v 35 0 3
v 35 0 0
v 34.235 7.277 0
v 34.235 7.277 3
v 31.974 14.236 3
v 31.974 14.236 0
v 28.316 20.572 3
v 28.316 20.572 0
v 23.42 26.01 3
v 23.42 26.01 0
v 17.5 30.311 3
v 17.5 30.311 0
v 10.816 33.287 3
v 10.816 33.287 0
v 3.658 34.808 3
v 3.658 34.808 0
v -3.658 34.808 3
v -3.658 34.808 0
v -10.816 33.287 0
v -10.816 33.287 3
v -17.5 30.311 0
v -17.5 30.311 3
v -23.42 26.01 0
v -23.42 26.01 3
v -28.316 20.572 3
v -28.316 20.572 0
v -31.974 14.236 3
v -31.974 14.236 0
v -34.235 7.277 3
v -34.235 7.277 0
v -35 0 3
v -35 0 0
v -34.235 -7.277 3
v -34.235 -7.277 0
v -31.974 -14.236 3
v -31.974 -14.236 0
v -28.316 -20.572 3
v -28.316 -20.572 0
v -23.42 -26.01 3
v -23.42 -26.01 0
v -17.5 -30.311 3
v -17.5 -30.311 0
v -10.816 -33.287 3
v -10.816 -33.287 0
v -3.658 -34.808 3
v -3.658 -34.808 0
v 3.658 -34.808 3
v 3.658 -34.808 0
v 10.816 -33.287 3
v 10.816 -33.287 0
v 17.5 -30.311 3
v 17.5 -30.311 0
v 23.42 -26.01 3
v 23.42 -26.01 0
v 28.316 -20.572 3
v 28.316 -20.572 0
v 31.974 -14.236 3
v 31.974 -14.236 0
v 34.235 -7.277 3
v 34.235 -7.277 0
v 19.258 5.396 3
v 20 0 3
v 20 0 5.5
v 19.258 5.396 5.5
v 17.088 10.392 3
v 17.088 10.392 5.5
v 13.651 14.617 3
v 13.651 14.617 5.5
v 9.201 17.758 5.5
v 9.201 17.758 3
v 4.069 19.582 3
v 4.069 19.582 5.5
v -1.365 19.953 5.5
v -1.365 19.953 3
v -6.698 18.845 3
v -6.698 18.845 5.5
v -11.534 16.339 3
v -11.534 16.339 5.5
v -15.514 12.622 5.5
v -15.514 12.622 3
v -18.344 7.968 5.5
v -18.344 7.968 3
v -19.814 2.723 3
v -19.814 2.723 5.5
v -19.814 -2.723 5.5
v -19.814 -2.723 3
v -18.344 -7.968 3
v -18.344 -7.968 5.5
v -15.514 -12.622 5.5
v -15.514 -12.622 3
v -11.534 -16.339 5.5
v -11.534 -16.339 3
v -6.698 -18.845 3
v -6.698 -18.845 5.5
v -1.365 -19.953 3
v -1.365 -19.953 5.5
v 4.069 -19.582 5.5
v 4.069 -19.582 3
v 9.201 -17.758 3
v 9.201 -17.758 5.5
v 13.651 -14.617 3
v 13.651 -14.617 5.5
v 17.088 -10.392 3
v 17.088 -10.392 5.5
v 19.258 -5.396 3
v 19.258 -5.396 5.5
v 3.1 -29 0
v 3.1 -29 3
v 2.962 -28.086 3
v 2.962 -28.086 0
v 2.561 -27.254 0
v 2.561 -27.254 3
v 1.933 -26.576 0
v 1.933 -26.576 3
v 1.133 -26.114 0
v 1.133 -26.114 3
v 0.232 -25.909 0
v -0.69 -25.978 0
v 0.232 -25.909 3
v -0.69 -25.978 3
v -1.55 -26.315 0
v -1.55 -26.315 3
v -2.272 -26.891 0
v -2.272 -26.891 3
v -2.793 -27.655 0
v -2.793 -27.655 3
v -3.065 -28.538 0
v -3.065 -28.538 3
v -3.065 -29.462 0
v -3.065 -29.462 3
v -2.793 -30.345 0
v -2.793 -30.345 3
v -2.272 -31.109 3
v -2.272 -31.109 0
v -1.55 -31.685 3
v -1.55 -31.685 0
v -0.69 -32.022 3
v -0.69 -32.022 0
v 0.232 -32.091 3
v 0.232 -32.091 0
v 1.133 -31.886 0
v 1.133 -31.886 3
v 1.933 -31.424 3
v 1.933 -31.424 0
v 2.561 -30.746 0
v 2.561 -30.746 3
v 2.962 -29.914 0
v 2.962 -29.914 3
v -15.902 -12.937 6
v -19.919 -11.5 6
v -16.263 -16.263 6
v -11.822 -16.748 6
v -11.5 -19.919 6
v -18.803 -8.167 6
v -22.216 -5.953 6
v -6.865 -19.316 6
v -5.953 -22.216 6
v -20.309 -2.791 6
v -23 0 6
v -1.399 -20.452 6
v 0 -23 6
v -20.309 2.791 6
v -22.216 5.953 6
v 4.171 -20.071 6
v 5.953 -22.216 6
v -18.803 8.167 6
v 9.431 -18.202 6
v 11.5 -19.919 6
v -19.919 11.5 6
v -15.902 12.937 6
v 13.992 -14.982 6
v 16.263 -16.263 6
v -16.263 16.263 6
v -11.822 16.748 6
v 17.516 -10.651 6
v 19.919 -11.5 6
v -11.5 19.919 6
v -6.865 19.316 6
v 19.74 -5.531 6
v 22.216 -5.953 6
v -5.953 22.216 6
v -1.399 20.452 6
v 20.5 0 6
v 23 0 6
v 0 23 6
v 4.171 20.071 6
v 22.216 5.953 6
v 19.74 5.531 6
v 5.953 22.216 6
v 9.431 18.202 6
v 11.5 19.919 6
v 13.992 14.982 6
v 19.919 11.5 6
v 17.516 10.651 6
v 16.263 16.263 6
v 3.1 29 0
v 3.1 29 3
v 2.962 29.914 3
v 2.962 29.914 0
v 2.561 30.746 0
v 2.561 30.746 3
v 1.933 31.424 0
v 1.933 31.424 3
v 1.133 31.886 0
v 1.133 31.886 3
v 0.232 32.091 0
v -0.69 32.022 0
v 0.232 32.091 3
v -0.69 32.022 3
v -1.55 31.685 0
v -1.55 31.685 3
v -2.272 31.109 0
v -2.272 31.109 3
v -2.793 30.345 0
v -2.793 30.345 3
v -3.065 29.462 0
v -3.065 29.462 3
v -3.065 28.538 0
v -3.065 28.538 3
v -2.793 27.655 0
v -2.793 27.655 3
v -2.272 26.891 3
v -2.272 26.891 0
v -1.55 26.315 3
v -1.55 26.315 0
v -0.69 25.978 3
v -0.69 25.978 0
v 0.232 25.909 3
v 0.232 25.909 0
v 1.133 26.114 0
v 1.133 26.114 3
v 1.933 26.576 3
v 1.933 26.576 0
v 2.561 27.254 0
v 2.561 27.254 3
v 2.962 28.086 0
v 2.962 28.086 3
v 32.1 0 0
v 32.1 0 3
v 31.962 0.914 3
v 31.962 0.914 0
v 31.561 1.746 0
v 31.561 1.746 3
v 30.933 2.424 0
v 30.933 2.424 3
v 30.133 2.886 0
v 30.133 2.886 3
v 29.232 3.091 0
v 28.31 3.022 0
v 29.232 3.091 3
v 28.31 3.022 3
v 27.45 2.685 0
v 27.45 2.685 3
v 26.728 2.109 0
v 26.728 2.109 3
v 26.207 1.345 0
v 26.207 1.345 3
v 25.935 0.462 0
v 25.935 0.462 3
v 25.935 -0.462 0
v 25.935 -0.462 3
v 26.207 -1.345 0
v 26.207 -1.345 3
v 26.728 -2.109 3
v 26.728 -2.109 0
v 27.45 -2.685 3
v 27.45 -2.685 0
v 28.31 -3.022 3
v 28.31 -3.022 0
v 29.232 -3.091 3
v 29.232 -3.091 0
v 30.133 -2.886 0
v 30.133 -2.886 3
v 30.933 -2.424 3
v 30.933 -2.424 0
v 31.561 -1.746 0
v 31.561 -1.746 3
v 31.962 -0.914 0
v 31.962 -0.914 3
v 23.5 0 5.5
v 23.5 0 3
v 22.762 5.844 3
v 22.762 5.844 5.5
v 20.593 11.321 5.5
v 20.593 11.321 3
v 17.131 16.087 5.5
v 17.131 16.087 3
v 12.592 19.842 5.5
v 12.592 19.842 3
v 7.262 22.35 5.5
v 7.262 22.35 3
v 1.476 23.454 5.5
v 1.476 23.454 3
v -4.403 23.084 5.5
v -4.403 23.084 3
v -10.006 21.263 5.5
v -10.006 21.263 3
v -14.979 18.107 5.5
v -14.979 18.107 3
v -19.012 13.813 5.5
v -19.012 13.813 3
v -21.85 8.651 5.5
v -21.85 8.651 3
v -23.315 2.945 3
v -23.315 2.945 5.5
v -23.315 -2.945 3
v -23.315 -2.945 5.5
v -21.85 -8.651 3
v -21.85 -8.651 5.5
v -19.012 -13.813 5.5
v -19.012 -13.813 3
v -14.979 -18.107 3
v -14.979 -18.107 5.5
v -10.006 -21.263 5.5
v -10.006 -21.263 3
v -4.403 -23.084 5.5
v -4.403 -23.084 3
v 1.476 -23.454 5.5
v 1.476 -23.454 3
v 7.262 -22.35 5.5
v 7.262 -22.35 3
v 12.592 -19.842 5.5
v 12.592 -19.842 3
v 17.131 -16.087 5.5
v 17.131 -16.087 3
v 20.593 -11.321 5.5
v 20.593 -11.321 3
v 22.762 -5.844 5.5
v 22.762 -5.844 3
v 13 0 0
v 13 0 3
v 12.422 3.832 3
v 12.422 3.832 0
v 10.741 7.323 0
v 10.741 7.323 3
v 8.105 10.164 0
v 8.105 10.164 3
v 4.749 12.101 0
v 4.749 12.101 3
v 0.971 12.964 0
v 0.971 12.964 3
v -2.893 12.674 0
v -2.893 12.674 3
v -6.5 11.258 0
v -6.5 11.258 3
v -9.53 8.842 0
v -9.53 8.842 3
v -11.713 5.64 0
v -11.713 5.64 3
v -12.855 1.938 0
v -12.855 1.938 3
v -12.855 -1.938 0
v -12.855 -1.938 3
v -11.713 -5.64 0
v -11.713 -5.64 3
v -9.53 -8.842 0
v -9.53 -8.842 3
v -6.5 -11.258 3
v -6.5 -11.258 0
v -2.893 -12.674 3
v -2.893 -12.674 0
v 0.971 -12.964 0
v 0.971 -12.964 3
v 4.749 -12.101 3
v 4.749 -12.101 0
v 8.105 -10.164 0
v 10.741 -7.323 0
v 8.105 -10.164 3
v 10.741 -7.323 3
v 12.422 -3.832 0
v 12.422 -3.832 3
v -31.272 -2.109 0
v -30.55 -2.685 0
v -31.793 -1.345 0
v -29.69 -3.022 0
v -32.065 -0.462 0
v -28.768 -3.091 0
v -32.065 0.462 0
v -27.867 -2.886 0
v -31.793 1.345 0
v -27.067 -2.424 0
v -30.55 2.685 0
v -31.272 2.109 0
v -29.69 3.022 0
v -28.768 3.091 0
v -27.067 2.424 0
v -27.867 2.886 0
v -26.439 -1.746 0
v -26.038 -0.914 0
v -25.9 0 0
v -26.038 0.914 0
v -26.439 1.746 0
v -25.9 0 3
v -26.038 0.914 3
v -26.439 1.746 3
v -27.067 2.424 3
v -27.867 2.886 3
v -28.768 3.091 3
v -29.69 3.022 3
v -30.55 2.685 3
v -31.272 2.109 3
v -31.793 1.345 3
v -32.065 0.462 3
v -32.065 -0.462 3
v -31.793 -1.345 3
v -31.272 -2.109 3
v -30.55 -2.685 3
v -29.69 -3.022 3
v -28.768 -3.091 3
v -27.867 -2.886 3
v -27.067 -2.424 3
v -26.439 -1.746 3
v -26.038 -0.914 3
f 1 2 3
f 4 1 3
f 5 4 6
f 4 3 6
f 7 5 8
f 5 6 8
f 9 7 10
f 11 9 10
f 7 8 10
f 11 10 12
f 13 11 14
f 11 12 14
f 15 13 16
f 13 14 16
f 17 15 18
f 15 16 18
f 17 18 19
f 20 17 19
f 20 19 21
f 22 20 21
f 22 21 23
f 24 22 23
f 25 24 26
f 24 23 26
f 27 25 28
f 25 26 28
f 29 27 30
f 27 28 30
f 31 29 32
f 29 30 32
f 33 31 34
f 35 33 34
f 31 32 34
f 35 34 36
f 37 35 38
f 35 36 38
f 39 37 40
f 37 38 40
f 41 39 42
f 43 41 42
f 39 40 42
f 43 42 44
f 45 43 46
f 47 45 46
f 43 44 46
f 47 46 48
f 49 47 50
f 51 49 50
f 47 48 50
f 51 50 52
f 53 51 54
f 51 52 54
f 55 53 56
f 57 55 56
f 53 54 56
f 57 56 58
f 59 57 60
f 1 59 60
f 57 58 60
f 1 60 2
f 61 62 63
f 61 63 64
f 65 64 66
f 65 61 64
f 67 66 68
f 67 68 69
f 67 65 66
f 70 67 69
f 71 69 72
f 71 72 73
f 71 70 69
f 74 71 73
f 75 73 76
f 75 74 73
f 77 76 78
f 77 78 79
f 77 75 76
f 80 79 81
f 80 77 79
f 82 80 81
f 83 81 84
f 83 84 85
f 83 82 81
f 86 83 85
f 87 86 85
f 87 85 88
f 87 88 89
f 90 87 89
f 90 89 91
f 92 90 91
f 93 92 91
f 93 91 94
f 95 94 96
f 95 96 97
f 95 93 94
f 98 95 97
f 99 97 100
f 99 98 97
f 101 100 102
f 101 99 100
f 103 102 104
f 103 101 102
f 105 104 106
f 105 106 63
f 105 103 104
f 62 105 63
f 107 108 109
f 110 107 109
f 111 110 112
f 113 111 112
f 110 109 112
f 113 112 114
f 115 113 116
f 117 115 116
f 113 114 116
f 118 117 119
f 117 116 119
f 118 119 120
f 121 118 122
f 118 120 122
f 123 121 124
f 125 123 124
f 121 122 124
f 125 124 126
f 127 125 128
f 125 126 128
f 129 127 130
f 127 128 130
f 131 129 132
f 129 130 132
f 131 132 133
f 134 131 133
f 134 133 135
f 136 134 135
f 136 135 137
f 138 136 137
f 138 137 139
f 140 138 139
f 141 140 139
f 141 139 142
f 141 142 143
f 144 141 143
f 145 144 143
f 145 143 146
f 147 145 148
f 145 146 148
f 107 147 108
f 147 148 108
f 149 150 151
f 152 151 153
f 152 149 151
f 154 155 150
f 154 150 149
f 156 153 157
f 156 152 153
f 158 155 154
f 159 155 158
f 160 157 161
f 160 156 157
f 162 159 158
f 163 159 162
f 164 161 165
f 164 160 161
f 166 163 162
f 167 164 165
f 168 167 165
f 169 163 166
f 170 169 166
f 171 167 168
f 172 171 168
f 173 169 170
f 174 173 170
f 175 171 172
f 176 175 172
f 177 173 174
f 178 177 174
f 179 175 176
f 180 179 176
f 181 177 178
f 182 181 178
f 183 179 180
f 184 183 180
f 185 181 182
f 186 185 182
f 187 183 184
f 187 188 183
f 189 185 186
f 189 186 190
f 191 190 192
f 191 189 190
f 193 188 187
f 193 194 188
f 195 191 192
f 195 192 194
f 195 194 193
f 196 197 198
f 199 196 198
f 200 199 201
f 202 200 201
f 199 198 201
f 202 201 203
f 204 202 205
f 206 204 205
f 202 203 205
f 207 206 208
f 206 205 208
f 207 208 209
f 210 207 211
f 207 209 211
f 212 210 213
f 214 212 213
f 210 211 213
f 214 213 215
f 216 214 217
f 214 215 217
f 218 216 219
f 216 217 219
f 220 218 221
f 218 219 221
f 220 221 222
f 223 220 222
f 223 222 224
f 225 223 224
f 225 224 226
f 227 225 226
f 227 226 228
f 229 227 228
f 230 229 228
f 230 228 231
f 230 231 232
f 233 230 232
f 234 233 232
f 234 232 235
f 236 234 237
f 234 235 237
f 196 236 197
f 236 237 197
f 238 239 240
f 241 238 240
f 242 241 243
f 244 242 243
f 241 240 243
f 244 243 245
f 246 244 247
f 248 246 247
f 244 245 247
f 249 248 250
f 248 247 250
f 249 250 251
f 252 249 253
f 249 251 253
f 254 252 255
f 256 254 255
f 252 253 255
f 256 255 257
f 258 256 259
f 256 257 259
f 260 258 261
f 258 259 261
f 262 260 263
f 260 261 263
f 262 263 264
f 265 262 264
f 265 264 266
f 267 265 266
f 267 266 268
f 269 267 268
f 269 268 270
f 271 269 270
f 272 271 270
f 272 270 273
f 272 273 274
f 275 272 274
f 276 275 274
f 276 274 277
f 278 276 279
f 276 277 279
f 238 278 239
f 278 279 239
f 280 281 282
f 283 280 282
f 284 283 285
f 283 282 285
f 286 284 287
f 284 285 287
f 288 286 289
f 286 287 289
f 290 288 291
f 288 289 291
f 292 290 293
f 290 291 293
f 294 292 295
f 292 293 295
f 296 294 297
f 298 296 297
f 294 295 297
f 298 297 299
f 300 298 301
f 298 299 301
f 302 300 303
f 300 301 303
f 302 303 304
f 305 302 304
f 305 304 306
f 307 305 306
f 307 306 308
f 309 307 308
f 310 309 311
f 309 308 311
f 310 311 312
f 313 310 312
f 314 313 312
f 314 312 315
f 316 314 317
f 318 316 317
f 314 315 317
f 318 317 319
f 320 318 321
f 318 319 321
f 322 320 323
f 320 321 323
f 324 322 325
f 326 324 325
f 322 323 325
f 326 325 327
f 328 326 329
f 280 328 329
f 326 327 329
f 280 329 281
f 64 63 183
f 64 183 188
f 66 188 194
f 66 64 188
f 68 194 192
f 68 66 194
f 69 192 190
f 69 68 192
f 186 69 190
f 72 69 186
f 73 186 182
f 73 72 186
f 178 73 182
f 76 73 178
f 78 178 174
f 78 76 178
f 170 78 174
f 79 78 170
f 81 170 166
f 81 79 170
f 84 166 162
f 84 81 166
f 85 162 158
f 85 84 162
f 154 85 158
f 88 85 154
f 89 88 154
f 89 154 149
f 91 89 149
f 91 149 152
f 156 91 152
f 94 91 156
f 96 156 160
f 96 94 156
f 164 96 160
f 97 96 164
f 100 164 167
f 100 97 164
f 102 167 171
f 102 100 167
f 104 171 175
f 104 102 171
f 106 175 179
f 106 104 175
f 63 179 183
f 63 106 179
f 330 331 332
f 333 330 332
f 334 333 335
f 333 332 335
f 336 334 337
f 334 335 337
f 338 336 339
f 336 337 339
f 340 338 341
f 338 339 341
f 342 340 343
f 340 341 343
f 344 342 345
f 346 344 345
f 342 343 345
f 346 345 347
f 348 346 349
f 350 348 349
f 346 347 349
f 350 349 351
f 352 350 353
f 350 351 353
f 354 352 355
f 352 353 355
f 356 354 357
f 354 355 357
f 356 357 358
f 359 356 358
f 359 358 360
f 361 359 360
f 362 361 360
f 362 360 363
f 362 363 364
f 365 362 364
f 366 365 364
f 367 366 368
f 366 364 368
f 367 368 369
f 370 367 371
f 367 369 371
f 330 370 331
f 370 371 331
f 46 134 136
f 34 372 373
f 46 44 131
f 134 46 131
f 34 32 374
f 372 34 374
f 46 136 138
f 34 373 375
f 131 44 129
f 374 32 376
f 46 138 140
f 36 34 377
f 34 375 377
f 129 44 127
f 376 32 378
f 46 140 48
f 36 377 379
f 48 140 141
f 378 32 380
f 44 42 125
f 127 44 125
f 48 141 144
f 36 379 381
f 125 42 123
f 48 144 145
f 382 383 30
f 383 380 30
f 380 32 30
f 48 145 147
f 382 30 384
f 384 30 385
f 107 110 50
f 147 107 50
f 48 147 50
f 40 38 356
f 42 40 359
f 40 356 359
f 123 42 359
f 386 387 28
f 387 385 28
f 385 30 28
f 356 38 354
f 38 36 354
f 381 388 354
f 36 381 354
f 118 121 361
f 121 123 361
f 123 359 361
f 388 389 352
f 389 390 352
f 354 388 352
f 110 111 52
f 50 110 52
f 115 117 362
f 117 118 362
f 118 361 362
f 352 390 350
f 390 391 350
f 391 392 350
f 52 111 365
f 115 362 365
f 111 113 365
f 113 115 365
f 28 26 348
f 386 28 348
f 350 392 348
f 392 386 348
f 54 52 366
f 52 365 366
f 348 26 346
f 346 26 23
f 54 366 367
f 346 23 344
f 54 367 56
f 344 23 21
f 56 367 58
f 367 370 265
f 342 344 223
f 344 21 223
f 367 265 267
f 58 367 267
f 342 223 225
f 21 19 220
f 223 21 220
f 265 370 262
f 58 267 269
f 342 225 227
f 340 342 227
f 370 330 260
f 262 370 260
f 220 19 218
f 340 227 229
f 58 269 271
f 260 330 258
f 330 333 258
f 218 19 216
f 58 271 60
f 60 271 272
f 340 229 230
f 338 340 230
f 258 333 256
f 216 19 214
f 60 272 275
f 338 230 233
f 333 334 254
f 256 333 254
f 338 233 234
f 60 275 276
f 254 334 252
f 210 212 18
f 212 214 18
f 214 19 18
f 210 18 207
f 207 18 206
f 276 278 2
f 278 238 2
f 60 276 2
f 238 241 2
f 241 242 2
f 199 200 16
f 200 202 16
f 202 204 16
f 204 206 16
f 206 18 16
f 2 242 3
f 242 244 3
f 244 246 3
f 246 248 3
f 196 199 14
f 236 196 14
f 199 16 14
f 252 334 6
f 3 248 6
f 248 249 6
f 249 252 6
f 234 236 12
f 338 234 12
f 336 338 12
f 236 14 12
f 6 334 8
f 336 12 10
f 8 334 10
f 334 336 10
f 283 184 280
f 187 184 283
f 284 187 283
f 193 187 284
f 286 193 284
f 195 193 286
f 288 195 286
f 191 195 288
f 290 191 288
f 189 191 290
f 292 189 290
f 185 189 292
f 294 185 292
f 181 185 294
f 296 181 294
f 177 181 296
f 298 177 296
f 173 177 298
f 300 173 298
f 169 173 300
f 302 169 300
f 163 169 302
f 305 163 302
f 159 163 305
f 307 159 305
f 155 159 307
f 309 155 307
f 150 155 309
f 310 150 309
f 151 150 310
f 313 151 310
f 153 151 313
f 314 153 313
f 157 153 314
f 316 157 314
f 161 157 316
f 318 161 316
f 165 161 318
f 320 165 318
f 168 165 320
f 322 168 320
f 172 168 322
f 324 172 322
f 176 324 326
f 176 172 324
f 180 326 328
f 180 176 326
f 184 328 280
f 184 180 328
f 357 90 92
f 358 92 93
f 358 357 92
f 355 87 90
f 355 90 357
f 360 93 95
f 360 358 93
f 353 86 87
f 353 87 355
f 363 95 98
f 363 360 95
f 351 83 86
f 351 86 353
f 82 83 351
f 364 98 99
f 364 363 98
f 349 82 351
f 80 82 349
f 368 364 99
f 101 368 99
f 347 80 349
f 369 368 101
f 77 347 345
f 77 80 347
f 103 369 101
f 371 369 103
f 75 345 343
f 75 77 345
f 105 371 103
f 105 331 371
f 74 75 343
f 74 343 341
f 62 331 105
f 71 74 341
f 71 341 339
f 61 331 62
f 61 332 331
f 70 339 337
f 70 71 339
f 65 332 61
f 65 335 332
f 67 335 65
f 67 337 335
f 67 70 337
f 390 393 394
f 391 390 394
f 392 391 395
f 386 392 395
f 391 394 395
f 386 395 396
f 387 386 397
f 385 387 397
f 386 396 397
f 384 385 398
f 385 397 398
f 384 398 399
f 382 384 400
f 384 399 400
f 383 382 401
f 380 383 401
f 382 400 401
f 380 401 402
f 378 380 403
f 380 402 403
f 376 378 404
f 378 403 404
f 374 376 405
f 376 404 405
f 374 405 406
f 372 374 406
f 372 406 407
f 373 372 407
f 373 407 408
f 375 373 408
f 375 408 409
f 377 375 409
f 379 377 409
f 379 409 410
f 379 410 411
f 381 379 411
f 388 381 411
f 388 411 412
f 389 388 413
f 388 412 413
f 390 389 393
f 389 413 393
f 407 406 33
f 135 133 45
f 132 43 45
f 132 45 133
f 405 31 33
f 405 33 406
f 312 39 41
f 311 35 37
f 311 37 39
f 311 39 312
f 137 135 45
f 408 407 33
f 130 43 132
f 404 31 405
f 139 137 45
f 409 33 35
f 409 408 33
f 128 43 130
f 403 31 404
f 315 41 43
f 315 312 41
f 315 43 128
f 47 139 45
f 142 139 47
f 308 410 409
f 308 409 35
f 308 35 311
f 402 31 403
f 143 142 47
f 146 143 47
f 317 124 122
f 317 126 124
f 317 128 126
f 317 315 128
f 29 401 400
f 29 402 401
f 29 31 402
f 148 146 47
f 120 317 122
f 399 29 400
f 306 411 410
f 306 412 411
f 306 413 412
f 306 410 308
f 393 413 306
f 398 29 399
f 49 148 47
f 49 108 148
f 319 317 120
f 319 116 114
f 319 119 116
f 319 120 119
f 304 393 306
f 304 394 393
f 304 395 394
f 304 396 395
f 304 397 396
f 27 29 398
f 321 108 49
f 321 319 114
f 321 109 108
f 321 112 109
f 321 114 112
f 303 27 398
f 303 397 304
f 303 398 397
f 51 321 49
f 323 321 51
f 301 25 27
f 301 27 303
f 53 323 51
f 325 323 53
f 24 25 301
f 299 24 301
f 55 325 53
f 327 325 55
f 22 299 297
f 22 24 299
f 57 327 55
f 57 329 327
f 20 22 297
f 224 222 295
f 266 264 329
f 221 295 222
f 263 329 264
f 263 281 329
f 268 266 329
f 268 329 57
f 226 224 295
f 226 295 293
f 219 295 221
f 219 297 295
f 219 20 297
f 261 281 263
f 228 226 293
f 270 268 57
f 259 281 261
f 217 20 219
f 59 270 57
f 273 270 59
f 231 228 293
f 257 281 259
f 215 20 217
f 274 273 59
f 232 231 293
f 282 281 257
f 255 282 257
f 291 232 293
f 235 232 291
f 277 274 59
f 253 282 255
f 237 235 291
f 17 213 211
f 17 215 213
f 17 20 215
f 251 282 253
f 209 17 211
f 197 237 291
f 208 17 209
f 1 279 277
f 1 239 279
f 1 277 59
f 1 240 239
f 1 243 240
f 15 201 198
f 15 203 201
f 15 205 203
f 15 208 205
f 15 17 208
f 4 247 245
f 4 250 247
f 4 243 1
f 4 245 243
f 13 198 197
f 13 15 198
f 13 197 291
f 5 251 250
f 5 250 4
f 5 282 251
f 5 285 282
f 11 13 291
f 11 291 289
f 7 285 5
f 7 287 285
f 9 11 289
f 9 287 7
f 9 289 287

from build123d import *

# Parameters (mm, degrees)
SKETCH1_R           = 35
BOSS_EXTRUDE1_DEPTH = 3
SKETCH2_R           = 13
SKETCH2_R_2         = 3.1
CUT_EXTRUDE1_DEPTH  = 3
SKETCH3_R           = 23.5
SKETCH3_R_2         = 20
BOSS_EXTRUDE2_DEPTH = 3
CHAMFER1_SIZE       = 0.5
CHAMFER2_SIZE       = 0.5


with BuildPart() as part:
    # Sketch1 → Boss-Extrude1 (new body)
    with BuildSketch(Plane.XY):
        Circle(SKETCH1_R)
    extrude(amount=BOSS_EXTRUDE1_DEPTH)

    # Sketch2 → Cut-Extrude1 (cut)
    with BuildSketch(Plane.XY.offset(3)):
        Circle(SKETCH2_R)
        with Locations((0, 29)):
            Circle(SKETCH2_R_2)
        with Locations((29, 0)):
            Circle(SKETCH2_R_2)
        with Locations((0, -29)):
            Circle(SKETCH2_R_2)
        with Locations((-29, 0)):
            Circle(SKETCH2_R_2)
    extrude(amount=-CUT_EXTRUDE1_DEPTH, mode=Mode.SUBTRACT)

    # Sketch3 → Boss-Extrude2 (add)
    with BuildSketch(Plane.XY.offset(3)):
        Circle(SKETCH3_R)
        Circle(SKETCH3_R_2, mode=Mode.SUBTRACT)
    extrude(amount=BOSS_EXTRUDE2_DEPTH)

    # Chamfer1
    chamfer1_edges = [part.edges().sort_by_distance(p)[0] for p in [
        (-23.5, 0, 6),
    ]]
    chamfer(chamfer1_edges, length=CHAMFER1_SIZE)

    # Chamfer2
    chamfer2_edges = [part.edges().sort_by_distance(p)[0] for p in [
        (-20, 0, 6),
    ]]
    chamfer(chamfer2_edges, length=CHAMFER2_SIZE)


solid = part.part
